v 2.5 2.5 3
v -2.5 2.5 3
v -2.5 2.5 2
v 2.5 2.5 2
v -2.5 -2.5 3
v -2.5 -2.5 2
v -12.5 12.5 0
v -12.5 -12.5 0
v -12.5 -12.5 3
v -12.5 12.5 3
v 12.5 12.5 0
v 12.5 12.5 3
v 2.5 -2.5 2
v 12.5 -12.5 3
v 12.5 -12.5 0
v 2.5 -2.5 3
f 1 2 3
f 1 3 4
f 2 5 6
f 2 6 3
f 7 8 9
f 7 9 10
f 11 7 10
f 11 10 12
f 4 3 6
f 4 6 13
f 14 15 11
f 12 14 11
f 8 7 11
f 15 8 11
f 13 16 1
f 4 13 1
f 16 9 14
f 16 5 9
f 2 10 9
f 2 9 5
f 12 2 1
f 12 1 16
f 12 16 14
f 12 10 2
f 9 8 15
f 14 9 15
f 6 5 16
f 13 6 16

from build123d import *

# Parameters (mm, degrees)
F0_W     = 25
F0_H     = 25
F1_DEPTH = 3
F2_W     = 5
F2_H     = 5
F3_DEPTH = 1


with BuildPart() as f1:
    # F0 (on Top) → F1 (new body)
    with BuildSketch(Plane.XY):
        Rectangle(F0_W, F0_H)
    extrude(amount=F1_DEPTH)


with BuildPart() as f3:
    # F2 (on face) → F3 (new body)
    with BuildSketch(Plane.XY.offset(3)):
        Rectangle(F2_W, F2_H)
    extrude(amount=-F3_DEPTH)


with BuildPart() as f1_1:
    add(f1.part)

    # F4: cut F3
    add(f3.part, mode=Mode.SUBTRACT)


solid = f1_1.part
